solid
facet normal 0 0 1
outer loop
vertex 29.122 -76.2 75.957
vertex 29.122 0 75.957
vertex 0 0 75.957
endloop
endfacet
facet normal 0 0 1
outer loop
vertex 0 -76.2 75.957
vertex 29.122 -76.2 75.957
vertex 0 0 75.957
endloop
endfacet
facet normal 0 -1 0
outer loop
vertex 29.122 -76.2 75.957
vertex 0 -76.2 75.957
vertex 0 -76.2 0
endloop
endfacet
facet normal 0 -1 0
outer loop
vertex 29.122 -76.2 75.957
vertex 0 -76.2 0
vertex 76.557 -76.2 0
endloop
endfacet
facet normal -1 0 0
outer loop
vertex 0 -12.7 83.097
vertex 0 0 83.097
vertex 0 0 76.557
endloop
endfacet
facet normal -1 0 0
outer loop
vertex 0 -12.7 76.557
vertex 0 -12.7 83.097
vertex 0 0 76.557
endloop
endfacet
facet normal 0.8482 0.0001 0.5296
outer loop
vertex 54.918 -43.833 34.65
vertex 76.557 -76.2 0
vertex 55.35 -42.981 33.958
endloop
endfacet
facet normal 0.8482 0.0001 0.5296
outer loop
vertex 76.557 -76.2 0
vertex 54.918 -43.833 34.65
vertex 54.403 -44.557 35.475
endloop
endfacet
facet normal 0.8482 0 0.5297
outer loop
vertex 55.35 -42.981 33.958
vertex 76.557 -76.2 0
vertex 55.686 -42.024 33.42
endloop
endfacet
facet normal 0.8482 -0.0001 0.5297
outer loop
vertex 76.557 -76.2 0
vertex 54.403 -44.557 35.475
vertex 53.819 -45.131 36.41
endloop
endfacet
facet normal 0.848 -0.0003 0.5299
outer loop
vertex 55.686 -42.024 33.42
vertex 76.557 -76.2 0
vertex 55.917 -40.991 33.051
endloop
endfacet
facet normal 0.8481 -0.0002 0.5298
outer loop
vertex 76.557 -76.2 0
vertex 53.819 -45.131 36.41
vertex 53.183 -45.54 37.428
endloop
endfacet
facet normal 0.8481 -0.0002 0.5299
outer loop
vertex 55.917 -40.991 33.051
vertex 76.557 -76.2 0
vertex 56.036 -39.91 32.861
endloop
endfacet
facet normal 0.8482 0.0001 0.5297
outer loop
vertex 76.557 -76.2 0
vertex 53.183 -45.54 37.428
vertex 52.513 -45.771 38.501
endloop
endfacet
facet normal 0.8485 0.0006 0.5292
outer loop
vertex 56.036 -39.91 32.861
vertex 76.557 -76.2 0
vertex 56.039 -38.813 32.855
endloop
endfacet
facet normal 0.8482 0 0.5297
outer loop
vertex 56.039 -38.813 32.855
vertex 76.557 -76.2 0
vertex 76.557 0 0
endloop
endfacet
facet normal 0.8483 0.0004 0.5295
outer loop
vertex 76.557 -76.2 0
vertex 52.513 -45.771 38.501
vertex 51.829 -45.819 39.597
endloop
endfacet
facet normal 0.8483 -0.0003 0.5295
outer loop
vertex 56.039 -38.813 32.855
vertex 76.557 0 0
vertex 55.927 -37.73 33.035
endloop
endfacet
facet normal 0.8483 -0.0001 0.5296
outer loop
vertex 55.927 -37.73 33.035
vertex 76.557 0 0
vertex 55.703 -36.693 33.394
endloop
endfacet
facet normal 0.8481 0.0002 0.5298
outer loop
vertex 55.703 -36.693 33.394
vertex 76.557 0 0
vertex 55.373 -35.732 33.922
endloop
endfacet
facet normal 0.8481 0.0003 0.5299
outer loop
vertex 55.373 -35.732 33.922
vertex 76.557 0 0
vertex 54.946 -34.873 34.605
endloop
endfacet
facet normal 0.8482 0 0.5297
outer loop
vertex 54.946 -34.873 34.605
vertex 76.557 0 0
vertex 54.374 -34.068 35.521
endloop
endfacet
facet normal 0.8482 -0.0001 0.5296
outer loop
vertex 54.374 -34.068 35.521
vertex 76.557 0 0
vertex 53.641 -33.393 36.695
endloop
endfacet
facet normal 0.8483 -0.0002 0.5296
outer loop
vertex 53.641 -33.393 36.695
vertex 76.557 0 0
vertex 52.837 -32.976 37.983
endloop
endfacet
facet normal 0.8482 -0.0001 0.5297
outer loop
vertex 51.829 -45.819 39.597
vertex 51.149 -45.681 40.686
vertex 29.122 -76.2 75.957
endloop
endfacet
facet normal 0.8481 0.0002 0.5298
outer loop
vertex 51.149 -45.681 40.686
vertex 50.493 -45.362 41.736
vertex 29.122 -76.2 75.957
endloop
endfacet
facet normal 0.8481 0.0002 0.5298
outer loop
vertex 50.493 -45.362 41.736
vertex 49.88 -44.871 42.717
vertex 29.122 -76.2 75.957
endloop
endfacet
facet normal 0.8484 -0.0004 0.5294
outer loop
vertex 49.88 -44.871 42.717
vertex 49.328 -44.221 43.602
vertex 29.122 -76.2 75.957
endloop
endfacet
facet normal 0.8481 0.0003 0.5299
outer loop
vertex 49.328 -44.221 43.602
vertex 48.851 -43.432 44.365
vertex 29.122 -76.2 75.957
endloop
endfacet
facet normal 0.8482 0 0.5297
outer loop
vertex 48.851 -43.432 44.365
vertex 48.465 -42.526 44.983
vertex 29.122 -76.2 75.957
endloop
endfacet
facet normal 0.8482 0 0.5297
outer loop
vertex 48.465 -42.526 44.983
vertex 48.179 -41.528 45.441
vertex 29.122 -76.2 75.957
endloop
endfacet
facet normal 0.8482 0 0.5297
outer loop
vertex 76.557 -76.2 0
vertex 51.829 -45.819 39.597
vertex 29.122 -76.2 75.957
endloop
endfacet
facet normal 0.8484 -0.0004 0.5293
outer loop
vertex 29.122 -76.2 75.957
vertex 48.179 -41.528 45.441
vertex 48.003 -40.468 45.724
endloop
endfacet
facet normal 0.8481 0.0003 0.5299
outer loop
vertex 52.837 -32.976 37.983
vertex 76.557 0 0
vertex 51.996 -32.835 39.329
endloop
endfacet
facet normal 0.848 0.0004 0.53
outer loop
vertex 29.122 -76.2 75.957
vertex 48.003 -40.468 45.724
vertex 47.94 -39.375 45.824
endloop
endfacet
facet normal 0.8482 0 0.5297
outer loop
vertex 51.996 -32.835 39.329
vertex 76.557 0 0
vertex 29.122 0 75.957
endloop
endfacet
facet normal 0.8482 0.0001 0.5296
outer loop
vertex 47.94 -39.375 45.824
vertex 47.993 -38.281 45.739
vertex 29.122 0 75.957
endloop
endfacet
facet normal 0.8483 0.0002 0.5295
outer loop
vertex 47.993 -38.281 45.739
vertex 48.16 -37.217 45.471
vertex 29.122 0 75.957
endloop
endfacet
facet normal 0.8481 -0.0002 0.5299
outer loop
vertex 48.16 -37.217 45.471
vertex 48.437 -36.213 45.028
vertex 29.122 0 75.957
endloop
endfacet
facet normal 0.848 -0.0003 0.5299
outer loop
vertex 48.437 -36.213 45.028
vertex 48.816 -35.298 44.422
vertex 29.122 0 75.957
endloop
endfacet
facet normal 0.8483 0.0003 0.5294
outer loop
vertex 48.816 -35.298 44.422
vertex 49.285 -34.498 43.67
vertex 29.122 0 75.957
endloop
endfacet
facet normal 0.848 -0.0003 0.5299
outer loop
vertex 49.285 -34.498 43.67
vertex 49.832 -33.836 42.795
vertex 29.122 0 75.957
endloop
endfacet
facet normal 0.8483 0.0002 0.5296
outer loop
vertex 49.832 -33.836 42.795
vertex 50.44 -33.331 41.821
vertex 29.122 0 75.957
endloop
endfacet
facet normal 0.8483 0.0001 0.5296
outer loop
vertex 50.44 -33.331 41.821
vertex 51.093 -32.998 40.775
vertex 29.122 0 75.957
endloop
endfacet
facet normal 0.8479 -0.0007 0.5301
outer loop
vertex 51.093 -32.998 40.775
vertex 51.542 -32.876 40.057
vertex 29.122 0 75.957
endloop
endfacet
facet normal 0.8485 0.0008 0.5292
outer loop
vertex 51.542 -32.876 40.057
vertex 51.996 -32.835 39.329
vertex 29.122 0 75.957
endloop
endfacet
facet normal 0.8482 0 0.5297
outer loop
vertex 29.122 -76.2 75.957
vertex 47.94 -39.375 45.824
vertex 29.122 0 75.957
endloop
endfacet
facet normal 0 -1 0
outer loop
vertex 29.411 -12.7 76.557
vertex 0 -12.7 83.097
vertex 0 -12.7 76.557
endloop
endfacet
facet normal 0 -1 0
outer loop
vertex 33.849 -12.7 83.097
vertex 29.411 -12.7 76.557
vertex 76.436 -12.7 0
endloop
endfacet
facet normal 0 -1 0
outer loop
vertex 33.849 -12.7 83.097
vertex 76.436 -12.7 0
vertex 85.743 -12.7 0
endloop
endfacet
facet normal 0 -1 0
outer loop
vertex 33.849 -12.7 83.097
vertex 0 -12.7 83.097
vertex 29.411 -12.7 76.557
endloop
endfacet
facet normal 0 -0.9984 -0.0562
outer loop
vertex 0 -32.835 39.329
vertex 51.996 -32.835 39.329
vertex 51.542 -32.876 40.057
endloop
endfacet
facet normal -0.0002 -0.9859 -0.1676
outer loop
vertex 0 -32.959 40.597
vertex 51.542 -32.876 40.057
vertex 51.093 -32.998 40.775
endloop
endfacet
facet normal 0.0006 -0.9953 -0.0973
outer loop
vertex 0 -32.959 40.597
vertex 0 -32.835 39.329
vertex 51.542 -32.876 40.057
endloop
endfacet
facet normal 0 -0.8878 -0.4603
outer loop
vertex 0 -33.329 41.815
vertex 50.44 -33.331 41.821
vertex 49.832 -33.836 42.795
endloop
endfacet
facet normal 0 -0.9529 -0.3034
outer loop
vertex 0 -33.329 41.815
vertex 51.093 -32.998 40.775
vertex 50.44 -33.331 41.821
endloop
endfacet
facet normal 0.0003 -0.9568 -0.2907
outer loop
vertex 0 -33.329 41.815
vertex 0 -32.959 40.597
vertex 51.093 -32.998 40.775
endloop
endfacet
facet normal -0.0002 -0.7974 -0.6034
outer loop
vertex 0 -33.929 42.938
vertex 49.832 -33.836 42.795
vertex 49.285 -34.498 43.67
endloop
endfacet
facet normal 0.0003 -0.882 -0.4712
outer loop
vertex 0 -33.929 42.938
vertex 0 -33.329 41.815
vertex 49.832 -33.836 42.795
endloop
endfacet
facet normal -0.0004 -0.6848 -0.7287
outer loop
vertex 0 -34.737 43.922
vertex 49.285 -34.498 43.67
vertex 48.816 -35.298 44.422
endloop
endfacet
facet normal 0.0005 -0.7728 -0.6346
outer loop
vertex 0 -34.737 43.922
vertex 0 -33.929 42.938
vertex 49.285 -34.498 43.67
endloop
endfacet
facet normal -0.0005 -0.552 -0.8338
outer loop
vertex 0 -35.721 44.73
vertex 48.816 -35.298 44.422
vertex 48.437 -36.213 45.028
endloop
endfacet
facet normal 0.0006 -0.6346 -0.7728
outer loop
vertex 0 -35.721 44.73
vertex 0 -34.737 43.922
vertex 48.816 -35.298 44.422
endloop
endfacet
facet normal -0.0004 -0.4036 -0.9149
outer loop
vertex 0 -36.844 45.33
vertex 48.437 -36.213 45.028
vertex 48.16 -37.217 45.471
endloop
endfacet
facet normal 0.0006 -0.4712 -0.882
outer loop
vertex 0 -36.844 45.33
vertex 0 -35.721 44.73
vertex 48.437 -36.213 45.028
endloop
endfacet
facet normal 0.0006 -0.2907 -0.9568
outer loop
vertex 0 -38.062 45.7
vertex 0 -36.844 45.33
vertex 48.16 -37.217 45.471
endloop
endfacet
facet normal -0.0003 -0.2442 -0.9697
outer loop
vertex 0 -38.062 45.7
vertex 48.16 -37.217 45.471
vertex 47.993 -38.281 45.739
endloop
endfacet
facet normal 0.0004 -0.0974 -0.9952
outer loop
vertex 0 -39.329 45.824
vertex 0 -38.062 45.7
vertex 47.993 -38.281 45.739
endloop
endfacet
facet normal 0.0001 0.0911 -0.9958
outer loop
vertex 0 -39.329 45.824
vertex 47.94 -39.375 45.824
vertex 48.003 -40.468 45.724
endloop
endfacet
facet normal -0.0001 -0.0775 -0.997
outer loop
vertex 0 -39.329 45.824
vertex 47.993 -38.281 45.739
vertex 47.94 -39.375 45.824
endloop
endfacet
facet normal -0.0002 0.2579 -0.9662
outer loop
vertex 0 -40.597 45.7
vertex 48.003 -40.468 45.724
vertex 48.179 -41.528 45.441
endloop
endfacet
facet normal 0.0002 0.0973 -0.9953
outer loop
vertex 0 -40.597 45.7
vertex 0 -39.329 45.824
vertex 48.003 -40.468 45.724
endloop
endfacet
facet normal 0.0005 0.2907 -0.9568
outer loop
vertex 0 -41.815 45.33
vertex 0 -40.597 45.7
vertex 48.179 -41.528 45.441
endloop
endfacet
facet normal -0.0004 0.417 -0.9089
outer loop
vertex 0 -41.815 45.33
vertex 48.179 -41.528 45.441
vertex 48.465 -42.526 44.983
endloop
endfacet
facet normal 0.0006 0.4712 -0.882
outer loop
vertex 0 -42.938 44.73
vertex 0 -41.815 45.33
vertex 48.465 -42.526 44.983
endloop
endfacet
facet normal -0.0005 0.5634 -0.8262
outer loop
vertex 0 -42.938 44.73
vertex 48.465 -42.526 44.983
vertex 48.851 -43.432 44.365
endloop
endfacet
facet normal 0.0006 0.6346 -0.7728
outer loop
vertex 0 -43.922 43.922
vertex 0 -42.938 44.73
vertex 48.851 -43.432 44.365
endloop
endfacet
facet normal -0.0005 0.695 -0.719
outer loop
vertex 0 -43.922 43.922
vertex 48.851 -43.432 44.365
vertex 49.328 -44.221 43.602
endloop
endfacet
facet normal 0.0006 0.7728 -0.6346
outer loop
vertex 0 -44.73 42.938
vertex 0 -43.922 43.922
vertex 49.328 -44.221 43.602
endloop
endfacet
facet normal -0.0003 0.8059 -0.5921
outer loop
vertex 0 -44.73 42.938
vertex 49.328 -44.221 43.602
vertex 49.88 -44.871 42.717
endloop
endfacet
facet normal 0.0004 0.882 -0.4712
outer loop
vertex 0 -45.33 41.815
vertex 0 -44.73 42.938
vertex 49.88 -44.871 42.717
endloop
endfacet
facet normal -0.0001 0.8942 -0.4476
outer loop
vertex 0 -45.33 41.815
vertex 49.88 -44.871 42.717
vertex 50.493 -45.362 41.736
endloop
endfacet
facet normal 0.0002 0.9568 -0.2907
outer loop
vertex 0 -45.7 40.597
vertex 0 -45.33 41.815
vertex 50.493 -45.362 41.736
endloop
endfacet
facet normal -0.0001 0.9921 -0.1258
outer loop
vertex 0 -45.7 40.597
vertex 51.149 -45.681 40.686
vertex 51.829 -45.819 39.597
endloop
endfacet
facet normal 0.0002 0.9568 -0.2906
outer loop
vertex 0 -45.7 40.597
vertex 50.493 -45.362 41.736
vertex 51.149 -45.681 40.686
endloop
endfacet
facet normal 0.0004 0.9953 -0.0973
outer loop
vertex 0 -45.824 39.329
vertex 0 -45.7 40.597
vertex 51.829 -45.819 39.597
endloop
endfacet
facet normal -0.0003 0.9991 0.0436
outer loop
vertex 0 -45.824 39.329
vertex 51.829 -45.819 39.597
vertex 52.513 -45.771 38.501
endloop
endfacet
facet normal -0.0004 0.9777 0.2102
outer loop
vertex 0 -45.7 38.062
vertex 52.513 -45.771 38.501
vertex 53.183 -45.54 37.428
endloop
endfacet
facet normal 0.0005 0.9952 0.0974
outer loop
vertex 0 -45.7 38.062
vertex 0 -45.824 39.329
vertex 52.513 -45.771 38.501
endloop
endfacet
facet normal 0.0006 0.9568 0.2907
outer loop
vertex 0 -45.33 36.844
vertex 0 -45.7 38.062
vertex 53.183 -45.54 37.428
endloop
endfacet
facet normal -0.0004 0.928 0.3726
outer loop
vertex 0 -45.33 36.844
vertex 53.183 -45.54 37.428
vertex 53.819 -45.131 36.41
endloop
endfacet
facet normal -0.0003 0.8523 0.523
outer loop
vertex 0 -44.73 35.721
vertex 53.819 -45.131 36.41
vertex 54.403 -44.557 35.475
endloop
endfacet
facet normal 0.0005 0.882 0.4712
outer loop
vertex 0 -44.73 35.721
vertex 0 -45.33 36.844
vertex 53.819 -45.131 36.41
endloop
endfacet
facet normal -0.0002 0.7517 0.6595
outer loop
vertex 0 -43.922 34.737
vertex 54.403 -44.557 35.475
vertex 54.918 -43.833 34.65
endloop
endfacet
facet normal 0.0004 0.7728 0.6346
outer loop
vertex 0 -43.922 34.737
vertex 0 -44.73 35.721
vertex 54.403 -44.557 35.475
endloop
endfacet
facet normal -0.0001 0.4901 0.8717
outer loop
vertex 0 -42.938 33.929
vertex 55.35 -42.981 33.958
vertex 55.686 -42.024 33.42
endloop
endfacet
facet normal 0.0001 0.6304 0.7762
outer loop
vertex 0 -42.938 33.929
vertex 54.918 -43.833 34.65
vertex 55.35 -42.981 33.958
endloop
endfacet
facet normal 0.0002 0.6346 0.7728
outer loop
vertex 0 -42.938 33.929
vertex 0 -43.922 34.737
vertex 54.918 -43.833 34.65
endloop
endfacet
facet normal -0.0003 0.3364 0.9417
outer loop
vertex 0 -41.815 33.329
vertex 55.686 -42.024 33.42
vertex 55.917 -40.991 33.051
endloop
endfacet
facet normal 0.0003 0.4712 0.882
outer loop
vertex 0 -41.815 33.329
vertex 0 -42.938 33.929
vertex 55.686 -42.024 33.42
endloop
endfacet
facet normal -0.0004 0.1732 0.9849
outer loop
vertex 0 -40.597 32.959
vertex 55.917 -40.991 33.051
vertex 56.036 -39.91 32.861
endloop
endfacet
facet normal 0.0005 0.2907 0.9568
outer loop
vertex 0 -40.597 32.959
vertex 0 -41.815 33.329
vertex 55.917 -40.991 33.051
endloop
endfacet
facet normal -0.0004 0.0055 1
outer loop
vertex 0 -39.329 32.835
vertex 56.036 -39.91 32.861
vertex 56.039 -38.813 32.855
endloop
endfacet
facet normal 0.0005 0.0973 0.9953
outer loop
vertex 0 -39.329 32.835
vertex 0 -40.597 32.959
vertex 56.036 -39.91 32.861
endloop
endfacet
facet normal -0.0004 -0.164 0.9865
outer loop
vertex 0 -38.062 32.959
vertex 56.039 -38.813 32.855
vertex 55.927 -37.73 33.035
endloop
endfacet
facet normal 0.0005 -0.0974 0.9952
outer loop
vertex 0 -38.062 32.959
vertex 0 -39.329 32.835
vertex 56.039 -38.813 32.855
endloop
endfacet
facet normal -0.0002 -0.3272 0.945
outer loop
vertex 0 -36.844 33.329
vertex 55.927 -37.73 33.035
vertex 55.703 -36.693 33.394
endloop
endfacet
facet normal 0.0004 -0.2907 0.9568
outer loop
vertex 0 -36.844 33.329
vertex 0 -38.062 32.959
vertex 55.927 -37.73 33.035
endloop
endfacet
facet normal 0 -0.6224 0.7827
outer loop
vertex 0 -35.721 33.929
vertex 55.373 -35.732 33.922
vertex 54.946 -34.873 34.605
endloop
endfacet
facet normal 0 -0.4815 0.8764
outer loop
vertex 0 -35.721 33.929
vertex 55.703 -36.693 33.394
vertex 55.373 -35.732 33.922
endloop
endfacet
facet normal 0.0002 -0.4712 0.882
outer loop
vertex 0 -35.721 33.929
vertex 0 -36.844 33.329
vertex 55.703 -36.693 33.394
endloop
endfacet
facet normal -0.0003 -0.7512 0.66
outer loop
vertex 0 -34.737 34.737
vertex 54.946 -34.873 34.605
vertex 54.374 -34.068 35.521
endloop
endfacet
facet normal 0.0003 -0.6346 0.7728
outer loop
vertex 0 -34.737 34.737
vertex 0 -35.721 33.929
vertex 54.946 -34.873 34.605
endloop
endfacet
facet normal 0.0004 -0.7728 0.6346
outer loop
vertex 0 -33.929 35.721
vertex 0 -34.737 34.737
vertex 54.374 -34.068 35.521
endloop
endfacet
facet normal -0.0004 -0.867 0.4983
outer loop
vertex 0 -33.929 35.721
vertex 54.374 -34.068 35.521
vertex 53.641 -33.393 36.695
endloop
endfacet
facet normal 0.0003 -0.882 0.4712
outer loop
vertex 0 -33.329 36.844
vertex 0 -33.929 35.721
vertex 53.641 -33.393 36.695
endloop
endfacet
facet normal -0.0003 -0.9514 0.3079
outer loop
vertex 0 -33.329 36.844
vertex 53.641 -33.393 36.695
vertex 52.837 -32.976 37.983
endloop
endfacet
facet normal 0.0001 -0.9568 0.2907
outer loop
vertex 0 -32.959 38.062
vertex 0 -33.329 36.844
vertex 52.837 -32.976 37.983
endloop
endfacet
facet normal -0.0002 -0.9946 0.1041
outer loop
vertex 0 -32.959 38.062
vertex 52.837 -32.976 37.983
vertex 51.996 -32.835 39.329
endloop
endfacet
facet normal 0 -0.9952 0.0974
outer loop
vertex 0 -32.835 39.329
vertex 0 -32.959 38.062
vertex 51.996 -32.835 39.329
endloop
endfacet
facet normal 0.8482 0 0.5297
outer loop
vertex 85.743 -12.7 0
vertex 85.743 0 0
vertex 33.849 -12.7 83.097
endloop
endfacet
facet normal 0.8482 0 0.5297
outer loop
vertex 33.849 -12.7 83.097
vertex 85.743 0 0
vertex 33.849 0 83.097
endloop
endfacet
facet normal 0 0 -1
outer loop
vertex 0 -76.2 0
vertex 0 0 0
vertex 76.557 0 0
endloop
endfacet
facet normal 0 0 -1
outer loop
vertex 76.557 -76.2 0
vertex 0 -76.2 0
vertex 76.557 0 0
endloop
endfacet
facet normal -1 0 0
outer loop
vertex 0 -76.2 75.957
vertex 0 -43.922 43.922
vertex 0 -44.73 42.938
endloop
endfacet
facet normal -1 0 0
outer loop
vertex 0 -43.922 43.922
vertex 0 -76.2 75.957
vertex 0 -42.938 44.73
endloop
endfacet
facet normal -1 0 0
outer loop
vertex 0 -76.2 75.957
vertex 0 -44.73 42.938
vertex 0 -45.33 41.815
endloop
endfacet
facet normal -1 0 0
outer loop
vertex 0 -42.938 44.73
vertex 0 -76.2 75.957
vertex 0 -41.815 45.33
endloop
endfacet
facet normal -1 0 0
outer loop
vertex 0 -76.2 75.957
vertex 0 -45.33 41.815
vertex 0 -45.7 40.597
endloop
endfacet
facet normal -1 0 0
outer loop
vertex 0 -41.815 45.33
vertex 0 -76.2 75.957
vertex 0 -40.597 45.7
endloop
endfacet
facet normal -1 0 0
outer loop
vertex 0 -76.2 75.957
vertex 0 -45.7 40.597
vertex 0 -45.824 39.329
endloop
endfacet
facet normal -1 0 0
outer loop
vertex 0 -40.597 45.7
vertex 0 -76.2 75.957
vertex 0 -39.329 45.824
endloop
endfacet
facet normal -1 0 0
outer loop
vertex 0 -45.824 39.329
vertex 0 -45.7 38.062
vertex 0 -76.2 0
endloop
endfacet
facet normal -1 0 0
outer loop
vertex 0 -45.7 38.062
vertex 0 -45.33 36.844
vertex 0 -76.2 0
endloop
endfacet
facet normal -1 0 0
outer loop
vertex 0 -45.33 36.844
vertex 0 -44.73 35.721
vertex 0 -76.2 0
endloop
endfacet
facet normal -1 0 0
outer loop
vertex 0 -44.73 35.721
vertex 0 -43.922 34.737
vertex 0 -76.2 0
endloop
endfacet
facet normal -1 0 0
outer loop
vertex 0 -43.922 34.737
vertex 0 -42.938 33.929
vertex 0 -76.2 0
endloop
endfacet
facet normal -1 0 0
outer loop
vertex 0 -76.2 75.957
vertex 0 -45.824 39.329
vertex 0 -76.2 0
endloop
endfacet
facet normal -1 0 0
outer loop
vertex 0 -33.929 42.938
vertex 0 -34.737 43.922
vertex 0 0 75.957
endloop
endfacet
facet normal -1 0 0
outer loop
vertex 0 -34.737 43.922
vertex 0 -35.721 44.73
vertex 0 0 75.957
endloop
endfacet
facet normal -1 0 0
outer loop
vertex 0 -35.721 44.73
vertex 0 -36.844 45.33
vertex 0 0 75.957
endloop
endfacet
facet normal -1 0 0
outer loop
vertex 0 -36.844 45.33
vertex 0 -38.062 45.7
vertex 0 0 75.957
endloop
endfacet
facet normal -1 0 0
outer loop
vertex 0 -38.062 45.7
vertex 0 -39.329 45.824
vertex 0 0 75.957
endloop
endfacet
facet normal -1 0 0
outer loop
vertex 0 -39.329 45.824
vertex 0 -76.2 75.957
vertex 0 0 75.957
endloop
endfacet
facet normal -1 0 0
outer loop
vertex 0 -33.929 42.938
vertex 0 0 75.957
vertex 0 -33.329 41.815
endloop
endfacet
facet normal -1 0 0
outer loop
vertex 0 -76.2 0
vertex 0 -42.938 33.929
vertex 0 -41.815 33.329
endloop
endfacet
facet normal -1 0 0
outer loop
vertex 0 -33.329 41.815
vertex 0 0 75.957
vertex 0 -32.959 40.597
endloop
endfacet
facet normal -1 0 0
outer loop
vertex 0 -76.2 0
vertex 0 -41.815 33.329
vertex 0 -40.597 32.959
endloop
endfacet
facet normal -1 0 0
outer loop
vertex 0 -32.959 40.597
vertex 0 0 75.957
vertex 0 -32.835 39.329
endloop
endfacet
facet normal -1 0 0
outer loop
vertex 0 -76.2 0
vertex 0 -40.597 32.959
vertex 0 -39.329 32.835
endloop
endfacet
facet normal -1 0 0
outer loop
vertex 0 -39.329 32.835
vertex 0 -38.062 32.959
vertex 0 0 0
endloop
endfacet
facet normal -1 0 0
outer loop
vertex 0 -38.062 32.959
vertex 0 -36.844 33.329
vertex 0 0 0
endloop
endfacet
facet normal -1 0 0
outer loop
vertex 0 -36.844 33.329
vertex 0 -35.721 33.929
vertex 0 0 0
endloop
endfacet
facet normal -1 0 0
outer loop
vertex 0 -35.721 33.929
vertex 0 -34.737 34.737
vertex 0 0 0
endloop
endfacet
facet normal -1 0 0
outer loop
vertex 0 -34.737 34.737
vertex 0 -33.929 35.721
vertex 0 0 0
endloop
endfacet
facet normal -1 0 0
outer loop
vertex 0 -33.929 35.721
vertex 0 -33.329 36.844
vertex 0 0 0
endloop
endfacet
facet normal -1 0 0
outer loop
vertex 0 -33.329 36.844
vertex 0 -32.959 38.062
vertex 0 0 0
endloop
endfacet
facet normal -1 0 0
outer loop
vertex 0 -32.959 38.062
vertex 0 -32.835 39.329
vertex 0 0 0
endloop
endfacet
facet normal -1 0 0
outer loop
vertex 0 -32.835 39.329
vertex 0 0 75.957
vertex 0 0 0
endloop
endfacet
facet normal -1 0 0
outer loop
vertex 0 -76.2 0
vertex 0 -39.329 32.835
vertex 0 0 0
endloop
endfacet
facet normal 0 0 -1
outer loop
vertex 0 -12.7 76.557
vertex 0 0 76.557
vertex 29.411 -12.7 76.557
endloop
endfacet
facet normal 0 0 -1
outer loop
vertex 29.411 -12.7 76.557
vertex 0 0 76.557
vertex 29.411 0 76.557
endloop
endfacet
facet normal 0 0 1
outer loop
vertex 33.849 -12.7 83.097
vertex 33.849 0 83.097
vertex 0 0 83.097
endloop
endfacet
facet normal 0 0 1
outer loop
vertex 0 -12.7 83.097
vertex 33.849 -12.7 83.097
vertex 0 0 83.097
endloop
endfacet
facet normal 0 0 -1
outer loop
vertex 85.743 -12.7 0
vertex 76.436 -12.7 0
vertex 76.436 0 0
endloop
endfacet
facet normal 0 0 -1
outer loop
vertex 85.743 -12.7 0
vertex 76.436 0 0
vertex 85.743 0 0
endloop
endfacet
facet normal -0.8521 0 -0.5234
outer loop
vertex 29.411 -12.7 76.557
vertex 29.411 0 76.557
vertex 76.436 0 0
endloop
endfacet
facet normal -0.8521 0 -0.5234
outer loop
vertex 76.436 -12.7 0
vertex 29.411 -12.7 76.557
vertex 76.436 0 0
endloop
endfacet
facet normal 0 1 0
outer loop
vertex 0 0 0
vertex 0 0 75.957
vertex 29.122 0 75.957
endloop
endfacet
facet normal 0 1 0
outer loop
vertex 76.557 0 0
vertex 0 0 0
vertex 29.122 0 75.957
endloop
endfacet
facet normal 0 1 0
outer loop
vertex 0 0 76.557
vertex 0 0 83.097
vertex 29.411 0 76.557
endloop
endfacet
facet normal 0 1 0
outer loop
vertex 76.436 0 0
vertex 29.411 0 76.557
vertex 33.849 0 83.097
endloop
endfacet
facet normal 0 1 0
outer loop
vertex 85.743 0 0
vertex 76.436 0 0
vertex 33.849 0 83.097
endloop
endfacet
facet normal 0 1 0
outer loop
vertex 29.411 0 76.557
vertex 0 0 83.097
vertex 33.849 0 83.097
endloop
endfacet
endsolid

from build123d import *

# Parameters (mm, degrees)
F1_DEPTH = 76.2
F2_R     = 6.494867
F3_DEPTH = 254
F5_DEPTH = 12.7


with BuildPart() as f1:
    # F0 (on Front) → F1 (new body)
    with BuildSketch(Plane.XZ):
        Polygon((0, 75.956963), (0, 0), (76.557413, 0), (29.121837, 75.956963), align=None)
    extrude(amount=F1_DEPTH)

    # F2 (on Right) → F3 (cut)
    with BuildSketch(Plane.YZ):
        with Locations((-39.329495, 39.329492)):
            Circle(F2_R)
    extrude(amount=F3_DEPTH, mode=Mode.SUBTRACT)


with BuildPart() as f5:
    # F4 (on Front) → F5 (new body)
    with BuildSketch(Plane.XZ):
        Polygon((29.411094, 76.557413), (76.435894, 0), (85.742868, 0), (33.848555, 83.096587), (0, 83.096587), (0, 76.557413), align=None)
    extrude(amount=F5_DEPTH)


solid = Compound([f1.part, f5.part])
